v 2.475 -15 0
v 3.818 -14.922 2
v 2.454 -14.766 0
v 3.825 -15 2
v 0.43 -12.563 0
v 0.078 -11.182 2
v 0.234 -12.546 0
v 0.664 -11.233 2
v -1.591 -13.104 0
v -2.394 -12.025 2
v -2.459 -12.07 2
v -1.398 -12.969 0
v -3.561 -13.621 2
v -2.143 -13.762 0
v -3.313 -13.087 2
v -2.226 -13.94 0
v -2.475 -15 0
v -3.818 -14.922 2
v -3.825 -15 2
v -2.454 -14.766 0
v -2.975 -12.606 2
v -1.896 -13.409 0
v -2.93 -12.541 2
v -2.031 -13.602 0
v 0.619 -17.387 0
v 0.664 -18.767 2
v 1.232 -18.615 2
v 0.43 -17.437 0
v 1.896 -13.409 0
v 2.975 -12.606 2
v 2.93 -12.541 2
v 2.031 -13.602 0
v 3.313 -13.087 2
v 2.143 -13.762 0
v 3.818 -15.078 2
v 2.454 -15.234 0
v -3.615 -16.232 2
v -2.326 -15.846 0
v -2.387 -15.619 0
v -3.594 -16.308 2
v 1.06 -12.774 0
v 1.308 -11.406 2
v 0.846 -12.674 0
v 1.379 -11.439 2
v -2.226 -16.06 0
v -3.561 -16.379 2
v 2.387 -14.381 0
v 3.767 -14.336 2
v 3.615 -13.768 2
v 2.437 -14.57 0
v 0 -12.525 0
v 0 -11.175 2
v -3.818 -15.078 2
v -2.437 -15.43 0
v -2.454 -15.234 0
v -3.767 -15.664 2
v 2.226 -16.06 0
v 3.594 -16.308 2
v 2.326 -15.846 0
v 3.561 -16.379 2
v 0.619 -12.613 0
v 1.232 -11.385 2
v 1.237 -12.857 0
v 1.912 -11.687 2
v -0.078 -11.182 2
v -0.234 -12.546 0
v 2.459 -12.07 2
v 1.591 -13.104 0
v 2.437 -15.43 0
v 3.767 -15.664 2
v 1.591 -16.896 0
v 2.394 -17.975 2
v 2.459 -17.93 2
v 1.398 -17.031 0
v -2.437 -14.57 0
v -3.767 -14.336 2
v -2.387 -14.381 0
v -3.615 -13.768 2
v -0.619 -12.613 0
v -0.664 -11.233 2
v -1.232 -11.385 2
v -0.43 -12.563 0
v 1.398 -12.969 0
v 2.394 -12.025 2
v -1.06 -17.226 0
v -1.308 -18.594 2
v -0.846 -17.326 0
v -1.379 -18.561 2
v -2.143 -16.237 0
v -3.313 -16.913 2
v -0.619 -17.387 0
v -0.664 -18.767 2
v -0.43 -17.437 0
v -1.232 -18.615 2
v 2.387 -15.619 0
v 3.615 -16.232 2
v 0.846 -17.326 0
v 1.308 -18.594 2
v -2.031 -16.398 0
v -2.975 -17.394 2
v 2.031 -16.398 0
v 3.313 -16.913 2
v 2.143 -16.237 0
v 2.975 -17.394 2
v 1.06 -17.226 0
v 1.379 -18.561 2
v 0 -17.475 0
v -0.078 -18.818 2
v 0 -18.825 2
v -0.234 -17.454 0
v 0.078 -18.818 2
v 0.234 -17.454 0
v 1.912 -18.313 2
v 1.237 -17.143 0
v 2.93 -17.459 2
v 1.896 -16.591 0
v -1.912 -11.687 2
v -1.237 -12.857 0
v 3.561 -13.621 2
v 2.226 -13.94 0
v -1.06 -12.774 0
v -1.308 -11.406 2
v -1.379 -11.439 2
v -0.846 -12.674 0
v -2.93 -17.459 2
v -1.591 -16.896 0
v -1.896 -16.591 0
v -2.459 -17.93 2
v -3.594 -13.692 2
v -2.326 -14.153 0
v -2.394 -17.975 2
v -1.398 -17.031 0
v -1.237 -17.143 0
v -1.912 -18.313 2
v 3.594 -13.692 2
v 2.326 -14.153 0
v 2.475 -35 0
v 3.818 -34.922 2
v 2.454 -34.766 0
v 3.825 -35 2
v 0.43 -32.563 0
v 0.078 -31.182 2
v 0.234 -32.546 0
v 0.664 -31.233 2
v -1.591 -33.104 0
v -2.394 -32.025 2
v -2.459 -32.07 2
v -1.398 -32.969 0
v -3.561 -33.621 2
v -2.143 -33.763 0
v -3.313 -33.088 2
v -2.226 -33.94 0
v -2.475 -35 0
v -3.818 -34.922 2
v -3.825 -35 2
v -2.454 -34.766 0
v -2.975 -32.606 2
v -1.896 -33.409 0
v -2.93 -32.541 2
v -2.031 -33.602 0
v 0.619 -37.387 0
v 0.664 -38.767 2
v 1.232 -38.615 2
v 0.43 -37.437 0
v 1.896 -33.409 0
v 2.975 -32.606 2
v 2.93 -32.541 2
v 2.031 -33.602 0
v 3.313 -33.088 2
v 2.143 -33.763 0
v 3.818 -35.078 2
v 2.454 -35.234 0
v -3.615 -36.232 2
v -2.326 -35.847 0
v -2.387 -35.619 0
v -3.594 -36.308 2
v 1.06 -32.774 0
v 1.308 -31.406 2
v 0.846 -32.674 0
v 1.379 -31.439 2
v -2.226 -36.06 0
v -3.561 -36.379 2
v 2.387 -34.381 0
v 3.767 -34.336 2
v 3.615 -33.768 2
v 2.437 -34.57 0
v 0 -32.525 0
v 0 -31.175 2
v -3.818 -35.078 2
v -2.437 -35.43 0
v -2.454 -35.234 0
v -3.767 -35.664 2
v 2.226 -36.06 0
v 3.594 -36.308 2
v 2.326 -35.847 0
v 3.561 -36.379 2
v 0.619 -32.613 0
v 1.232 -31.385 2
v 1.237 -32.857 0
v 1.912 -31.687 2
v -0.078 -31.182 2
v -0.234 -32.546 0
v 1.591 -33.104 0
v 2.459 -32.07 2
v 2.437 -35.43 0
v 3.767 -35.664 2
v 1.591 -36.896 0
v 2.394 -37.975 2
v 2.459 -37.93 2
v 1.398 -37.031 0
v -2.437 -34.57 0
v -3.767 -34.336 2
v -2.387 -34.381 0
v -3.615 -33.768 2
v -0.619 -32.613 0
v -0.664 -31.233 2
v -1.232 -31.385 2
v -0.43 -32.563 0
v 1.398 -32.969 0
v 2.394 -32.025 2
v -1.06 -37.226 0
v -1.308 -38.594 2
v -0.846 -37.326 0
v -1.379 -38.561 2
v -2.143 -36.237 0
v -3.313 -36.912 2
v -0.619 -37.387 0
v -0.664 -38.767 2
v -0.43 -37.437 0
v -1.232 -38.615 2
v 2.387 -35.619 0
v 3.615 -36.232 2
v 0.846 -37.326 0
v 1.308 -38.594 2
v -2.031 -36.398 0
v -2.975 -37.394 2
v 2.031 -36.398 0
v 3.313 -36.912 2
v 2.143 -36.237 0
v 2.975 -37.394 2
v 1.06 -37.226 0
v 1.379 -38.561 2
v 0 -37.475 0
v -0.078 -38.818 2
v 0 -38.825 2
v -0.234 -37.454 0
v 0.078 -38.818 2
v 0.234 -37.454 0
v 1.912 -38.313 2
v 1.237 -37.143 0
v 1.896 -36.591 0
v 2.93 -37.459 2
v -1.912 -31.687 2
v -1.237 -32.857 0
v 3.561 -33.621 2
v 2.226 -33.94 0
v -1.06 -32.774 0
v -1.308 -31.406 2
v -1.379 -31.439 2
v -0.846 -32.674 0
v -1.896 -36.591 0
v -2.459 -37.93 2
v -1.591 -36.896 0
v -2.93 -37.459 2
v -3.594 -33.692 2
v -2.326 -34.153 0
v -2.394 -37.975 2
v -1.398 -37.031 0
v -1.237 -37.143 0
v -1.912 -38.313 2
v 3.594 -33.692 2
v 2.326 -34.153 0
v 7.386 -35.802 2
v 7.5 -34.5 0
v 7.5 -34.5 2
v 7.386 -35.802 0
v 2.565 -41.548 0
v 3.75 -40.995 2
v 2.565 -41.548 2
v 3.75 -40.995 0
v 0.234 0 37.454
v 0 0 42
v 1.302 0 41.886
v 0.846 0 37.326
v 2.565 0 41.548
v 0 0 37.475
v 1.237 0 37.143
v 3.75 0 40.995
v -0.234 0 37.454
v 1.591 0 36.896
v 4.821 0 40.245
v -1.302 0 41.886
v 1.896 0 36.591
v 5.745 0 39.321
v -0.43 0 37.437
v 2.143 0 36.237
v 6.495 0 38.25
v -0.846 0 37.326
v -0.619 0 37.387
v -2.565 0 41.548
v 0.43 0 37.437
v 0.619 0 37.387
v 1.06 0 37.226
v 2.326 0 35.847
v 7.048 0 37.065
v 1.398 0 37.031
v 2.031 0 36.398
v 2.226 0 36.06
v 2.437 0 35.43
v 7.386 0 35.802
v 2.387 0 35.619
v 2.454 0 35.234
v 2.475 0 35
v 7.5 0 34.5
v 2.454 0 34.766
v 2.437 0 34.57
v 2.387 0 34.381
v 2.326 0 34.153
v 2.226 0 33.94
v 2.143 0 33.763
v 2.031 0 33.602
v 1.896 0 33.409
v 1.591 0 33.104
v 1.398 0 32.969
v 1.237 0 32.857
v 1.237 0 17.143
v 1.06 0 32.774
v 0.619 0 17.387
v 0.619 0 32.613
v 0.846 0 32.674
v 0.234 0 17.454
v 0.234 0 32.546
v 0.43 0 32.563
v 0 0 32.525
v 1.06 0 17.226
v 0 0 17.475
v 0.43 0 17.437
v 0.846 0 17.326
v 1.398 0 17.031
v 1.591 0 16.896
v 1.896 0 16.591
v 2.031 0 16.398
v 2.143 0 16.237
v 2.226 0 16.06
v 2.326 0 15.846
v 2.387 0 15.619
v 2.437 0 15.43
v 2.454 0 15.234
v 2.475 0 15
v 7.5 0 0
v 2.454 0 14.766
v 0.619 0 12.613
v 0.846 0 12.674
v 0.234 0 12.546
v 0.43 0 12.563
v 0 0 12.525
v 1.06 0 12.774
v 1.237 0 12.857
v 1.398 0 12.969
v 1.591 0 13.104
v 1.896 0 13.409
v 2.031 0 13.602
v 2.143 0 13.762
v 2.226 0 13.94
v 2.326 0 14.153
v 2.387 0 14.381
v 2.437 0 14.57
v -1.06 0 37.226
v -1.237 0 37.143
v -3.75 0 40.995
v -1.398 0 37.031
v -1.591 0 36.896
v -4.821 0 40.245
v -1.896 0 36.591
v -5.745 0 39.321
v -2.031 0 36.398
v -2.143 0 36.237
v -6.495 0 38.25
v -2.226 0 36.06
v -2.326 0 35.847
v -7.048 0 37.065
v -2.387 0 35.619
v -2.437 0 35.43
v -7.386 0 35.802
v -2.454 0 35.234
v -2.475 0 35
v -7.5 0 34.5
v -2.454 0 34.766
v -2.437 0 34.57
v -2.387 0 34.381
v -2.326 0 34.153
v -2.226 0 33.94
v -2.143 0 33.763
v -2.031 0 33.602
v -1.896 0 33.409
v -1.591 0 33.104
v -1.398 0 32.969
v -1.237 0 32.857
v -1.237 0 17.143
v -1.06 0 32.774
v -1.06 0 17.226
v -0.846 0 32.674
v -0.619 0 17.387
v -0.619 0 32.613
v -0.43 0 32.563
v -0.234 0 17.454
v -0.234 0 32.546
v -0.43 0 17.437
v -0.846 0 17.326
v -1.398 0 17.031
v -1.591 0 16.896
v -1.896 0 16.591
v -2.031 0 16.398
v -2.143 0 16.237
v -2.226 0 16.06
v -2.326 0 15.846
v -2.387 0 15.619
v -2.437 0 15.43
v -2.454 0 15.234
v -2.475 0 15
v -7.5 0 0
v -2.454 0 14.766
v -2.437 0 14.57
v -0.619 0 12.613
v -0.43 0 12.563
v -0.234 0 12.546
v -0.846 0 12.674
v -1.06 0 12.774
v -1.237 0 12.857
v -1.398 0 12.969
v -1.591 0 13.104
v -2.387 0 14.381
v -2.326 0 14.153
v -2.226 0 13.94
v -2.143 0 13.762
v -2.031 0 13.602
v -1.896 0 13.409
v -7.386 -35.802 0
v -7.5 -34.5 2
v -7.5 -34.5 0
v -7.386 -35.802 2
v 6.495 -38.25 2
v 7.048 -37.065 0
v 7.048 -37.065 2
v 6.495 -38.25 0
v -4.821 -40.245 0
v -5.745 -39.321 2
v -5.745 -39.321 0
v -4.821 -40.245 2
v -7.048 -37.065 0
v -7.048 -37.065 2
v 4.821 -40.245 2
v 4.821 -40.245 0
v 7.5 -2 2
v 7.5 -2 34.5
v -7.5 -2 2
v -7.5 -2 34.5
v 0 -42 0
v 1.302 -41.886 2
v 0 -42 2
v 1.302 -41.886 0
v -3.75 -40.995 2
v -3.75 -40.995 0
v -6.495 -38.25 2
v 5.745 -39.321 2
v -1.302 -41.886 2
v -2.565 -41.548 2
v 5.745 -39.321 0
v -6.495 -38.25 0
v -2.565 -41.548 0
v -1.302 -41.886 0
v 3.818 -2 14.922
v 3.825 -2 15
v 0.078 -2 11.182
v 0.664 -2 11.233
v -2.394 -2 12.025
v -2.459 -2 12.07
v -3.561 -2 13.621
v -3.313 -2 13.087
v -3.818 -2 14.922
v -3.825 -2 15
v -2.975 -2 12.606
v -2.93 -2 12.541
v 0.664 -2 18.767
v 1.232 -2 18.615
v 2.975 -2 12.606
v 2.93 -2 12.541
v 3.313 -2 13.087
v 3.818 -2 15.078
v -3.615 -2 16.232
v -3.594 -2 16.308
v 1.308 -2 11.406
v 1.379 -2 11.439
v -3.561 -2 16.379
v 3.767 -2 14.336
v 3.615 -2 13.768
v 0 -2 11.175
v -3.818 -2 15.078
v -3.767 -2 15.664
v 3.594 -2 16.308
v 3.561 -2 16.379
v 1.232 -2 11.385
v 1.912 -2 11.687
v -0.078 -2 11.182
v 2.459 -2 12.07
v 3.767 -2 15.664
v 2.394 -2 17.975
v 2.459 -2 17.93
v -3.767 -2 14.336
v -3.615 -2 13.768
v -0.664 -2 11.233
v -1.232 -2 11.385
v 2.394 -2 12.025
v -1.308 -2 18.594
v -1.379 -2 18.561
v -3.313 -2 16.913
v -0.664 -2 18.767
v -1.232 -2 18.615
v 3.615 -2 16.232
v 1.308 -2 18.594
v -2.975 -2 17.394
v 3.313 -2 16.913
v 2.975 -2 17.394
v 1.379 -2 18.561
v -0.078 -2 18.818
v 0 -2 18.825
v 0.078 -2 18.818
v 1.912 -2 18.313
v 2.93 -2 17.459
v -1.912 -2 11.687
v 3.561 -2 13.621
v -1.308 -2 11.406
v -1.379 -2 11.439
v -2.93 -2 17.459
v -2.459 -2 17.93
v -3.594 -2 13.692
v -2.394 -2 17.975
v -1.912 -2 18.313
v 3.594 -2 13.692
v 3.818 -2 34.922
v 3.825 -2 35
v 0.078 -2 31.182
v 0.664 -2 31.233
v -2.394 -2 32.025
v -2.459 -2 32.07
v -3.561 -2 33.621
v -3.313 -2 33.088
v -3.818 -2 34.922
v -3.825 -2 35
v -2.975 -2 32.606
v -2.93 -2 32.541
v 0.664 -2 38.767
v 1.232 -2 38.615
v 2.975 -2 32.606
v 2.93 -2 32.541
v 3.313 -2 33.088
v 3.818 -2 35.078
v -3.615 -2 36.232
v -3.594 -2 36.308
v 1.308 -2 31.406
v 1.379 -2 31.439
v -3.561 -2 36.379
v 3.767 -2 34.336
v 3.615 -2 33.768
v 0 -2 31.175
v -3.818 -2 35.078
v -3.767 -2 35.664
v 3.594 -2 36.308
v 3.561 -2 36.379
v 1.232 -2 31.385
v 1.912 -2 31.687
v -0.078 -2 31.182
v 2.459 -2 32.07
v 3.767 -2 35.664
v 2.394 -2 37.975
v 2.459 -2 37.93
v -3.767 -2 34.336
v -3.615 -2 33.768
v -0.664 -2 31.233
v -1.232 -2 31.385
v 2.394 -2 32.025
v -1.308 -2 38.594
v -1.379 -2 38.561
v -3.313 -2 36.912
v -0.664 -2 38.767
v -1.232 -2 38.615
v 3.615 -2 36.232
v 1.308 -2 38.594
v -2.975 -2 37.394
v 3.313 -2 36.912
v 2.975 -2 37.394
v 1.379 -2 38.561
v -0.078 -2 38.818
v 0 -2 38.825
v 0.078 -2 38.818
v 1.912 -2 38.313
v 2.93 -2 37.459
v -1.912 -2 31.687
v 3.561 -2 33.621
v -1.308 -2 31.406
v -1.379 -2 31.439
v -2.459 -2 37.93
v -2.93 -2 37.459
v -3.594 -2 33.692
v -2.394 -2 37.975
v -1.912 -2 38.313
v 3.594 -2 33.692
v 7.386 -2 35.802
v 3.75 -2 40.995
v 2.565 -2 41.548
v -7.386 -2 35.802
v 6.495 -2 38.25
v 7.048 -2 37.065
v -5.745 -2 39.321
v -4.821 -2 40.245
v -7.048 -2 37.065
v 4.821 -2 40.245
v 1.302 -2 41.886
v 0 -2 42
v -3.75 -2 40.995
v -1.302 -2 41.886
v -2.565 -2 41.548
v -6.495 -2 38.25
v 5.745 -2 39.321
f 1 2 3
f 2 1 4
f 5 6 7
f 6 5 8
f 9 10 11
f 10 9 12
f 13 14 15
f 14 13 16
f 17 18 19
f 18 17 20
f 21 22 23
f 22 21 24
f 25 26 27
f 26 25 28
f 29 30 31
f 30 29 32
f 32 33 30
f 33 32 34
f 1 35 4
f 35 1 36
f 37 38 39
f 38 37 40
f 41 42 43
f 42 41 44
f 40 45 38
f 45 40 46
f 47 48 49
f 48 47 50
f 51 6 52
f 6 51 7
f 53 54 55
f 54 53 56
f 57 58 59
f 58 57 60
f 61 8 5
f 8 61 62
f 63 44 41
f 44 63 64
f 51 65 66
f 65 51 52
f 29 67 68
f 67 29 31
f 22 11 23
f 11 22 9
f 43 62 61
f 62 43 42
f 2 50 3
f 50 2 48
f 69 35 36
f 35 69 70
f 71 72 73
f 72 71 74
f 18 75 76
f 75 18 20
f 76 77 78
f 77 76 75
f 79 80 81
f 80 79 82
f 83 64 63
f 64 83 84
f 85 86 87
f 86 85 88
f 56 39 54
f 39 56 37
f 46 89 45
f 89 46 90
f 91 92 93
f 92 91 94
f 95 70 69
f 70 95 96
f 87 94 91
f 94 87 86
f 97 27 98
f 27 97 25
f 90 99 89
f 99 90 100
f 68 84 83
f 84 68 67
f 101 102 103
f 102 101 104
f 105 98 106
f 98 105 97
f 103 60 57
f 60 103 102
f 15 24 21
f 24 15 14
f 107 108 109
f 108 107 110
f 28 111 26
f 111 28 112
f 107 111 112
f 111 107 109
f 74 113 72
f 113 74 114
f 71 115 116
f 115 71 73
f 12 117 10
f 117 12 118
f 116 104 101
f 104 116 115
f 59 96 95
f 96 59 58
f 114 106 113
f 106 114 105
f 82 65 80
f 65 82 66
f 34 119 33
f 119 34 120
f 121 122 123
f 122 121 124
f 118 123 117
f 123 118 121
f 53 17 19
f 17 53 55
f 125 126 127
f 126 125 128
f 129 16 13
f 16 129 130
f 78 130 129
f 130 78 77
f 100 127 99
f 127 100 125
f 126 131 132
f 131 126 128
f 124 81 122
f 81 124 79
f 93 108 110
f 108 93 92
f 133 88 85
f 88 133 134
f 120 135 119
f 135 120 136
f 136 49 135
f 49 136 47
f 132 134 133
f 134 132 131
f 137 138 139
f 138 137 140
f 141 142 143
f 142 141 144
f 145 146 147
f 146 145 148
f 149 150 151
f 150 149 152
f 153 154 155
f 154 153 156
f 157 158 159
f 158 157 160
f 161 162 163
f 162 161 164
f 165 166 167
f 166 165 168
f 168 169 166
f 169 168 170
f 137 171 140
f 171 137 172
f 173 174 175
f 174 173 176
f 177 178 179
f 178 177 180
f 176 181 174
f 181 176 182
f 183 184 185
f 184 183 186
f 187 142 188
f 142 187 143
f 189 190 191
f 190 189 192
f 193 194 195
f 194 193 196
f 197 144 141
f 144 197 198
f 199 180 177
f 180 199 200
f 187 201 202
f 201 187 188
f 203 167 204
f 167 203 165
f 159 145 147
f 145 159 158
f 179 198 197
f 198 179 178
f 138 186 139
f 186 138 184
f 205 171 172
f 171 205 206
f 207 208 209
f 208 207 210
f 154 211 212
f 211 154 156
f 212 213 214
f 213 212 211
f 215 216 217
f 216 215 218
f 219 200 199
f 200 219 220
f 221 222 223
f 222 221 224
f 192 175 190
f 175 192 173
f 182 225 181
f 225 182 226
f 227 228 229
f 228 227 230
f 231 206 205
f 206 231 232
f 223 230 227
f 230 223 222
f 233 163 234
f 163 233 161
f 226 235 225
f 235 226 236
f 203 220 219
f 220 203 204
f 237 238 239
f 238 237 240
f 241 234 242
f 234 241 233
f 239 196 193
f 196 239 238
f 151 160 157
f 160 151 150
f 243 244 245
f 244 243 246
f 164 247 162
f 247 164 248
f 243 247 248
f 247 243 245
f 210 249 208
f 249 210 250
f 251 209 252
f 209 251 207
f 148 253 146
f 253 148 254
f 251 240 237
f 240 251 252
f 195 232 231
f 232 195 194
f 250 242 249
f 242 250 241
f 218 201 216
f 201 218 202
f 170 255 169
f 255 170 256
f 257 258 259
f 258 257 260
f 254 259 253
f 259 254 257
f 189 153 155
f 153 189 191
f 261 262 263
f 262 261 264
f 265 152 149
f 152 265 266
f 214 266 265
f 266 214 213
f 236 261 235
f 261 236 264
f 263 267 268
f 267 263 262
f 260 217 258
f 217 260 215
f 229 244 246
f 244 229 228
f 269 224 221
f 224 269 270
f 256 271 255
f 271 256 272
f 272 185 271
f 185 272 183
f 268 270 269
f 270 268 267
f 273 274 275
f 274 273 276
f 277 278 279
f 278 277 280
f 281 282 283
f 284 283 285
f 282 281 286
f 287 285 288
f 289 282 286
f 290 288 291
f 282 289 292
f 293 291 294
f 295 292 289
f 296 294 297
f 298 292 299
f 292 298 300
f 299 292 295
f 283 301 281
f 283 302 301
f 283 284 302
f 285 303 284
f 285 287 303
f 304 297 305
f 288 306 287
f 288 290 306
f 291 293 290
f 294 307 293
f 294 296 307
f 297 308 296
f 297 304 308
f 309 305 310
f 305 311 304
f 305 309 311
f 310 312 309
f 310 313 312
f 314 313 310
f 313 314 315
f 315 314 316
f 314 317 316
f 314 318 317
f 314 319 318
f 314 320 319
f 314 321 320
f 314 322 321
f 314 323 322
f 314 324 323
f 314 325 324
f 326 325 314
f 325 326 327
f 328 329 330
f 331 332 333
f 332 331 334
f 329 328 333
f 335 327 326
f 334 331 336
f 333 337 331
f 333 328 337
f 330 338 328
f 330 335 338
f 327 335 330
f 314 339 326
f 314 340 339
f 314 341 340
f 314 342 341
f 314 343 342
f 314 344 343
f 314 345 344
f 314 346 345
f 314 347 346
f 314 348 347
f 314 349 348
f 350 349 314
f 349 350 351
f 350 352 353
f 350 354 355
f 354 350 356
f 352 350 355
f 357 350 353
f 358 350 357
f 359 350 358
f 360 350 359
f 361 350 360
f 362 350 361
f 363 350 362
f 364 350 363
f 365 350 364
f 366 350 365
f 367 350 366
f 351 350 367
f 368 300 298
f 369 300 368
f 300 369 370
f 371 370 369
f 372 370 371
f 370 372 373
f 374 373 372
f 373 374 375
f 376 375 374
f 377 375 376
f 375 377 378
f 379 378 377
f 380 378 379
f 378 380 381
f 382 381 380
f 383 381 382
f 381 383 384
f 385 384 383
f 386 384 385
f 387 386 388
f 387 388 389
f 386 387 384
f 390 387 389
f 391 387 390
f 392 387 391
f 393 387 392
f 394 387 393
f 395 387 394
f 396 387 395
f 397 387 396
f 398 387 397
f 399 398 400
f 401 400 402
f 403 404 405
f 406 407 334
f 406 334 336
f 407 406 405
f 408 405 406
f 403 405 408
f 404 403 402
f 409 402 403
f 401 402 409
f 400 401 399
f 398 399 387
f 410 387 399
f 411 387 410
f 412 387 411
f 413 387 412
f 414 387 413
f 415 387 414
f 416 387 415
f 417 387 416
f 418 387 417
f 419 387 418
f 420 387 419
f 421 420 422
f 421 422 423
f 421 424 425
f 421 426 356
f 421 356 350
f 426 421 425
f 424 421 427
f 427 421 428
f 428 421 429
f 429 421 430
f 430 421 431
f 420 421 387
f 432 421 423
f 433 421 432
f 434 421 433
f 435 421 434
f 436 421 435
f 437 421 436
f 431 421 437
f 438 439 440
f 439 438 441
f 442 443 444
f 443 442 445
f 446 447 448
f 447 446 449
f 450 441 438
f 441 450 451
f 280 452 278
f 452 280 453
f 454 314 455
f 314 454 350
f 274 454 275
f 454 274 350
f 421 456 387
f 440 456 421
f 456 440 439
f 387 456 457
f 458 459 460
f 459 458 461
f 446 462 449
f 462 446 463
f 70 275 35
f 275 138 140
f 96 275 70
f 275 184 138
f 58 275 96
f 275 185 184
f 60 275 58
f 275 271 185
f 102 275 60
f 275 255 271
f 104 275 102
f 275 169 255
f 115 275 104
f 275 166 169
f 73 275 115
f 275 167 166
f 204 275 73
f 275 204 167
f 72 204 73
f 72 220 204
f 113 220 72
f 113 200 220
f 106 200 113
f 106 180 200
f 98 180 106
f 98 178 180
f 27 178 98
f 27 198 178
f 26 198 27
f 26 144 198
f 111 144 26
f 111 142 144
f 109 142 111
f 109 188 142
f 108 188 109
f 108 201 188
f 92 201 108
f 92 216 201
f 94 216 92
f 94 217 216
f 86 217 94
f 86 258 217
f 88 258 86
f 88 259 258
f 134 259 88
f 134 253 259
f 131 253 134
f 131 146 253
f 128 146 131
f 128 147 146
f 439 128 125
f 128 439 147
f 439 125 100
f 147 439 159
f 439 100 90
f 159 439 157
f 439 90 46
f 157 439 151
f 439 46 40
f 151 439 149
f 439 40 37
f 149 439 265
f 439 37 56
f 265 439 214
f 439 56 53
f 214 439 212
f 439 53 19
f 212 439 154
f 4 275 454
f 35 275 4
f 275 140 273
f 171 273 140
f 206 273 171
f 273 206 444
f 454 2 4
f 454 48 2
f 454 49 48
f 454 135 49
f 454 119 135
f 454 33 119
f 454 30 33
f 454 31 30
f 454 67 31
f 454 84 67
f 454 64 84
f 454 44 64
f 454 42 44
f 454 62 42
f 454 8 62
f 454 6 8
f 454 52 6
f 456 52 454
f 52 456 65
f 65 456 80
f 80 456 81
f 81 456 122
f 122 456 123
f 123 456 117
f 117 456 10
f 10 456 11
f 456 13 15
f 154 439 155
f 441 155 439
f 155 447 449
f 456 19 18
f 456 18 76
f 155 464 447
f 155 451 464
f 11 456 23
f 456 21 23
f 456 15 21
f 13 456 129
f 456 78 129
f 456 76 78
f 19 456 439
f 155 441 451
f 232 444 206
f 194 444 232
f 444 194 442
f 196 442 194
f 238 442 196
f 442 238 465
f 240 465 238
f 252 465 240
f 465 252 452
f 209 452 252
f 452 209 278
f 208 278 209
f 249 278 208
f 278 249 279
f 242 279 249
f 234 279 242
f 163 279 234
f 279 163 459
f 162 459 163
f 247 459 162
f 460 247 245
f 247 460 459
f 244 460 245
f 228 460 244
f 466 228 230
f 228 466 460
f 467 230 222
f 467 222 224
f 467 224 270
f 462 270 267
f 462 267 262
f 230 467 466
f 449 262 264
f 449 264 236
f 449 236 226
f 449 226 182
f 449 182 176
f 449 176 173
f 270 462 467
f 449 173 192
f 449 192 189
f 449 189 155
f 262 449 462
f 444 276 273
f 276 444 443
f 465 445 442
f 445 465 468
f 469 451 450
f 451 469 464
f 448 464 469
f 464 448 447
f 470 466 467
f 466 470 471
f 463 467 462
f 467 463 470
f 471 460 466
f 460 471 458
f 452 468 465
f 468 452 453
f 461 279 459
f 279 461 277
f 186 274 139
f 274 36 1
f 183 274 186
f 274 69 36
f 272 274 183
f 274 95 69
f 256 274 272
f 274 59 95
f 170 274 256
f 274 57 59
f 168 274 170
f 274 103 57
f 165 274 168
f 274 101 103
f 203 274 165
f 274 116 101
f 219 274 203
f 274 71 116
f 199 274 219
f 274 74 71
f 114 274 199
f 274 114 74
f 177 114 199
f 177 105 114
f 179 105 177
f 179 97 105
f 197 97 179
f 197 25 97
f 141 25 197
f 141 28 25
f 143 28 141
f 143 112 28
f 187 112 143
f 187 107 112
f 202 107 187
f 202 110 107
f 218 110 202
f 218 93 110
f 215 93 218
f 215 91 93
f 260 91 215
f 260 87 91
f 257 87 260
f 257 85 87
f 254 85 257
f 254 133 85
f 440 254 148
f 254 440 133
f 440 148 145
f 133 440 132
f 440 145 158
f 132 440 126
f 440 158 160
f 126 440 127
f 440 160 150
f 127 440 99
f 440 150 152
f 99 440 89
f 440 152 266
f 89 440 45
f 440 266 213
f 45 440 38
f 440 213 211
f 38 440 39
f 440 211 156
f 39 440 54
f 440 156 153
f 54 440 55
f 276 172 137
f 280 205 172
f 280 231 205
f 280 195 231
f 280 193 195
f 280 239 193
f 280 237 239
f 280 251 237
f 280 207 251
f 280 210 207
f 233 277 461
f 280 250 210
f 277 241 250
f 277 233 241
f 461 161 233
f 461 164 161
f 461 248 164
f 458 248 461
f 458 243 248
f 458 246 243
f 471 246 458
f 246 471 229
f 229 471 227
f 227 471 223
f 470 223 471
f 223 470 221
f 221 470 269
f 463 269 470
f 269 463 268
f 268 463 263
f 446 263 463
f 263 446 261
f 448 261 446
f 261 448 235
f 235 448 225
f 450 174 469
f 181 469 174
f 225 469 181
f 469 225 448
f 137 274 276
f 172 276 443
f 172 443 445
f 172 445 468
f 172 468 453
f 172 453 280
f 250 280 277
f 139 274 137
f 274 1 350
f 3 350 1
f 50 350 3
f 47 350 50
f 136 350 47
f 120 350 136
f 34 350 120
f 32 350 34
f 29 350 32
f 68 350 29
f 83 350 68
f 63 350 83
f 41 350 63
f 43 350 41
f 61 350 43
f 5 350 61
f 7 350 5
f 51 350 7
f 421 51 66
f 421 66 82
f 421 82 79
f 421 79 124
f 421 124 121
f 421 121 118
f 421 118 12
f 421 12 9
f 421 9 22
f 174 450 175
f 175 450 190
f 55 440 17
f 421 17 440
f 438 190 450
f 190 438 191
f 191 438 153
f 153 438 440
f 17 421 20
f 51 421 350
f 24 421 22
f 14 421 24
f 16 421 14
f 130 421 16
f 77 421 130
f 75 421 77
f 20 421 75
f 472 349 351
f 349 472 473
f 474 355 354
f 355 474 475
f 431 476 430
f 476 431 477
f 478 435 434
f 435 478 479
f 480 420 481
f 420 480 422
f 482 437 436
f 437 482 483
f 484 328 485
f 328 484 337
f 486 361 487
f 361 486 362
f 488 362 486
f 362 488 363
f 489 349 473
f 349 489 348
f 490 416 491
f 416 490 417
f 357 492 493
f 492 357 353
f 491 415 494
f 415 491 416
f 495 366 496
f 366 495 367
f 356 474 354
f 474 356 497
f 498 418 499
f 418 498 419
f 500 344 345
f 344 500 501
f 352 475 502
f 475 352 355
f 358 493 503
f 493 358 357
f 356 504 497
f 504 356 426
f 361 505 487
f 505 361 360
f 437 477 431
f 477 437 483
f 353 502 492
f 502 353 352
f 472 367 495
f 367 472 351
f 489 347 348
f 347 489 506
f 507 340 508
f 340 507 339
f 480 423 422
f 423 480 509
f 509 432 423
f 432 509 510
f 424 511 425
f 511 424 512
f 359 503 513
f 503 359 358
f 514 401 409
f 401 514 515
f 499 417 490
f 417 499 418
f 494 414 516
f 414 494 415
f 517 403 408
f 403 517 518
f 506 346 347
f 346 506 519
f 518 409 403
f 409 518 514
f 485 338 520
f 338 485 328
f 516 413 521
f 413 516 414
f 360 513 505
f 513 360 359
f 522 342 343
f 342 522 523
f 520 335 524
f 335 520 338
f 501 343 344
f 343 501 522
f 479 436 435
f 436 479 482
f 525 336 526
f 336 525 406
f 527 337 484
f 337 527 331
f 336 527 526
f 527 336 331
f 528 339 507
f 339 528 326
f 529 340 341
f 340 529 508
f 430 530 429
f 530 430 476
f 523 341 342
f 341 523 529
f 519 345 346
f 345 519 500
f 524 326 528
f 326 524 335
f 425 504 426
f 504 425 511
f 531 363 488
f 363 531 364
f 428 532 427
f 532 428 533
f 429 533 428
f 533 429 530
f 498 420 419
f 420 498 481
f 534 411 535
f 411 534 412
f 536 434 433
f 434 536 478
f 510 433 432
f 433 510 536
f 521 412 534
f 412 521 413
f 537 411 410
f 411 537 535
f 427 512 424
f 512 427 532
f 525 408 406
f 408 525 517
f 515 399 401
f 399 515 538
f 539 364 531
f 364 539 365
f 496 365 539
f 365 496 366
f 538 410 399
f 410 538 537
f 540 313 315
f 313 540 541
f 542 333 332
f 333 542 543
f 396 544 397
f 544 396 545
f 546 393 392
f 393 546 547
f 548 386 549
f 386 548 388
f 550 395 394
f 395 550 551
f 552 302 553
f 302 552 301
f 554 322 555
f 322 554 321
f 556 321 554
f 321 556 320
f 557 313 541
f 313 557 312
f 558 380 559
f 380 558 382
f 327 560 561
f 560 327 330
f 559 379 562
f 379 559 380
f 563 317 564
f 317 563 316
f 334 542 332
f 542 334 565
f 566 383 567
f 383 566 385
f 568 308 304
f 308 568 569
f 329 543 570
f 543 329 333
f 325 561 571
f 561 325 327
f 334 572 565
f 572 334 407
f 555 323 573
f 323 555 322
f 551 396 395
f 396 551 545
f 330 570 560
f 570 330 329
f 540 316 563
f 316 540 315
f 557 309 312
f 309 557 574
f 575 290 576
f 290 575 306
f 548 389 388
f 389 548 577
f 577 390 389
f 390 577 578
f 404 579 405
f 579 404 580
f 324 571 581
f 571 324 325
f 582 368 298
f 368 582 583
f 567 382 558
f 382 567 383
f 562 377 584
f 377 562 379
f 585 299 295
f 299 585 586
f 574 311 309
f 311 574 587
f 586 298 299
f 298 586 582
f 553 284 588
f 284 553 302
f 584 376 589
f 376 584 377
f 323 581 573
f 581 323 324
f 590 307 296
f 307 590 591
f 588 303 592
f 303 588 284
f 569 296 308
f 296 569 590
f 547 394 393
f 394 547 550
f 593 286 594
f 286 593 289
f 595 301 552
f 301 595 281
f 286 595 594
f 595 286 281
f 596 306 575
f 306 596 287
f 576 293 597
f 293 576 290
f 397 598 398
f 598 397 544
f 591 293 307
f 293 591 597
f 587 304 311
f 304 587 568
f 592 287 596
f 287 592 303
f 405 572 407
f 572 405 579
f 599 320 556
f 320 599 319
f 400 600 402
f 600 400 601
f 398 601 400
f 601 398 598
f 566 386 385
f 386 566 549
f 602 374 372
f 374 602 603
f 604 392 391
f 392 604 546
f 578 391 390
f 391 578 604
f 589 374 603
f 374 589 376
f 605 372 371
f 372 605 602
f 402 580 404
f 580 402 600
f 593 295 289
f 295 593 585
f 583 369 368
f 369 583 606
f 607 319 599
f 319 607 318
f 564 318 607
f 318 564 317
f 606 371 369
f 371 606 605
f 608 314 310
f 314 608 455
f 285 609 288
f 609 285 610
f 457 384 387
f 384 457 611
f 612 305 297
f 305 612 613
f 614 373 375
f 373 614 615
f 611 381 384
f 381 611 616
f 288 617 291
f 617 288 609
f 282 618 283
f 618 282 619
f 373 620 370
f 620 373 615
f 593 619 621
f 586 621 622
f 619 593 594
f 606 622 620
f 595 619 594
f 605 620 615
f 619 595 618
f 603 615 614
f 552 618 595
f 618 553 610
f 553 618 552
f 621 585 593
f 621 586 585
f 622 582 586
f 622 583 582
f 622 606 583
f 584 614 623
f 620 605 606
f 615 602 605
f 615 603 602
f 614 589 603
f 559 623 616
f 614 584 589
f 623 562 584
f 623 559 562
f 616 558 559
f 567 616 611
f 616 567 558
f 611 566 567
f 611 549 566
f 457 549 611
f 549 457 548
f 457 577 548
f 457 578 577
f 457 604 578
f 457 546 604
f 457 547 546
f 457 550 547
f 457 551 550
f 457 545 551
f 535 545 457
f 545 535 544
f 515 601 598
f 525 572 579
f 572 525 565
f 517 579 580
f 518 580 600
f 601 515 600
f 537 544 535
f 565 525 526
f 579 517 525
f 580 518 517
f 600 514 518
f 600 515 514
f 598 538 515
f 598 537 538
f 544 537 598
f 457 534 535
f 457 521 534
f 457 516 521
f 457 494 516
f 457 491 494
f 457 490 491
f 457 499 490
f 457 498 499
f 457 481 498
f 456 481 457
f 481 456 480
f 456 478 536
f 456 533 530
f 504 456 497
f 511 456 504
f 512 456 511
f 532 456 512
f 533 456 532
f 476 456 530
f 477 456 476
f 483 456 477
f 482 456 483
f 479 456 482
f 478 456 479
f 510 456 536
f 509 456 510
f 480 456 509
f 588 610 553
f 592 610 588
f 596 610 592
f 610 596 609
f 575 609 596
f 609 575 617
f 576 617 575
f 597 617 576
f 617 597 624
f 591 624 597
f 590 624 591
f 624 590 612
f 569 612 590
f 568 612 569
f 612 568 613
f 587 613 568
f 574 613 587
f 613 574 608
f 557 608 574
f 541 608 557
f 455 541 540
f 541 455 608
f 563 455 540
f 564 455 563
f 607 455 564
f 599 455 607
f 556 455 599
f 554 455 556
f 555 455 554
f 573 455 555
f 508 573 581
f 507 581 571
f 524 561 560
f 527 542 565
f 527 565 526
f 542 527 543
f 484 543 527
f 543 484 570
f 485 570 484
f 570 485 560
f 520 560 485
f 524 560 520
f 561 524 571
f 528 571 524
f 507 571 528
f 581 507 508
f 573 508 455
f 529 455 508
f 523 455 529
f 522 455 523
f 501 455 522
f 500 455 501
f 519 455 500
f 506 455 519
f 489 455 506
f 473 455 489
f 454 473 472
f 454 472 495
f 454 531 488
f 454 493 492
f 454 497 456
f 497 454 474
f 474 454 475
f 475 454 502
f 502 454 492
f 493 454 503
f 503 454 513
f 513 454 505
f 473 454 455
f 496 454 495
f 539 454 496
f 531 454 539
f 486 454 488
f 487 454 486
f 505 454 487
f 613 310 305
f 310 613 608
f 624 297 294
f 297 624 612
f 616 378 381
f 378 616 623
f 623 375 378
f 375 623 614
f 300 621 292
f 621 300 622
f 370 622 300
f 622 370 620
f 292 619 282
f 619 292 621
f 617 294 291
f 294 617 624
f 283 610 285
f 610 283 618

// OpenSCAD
$fa = 10;
$fs = 0.1;

function small_bracket_depth() = 2;

function small_bracket_width() = 15;

function small_bracket_length() = 42;

function small_bracket_origin_to_holes_t() = [[0,-15,0],[0,-35,0]];

module small_bracket_half() {
  difference() {
    linear_extrude(height=small_bracket_depth()) {
      translate([-small_bracket_width()/2, - small_bracket_length() + small_bracket_width()/2])
        square([small_bracket_width(),small_bracket_length()-small_bracket_width()/2]);
      translate([0, -small_bracket_length()+small_bracket_width()/2])
        #circle(small_bracket_width()/2);
    }
    for (hole_t=small_bracket_origin_to_holes_t()) {
      translate(hole_t + [0,0,-1])
        cylinder(small_bracket_depth()+2,1.8,4.5);
    }
  }
}

module small_bracket() {
  small_bracket_half();
  mirror([0,1,1])
    small_bracket_half();
}

small_bracket();
